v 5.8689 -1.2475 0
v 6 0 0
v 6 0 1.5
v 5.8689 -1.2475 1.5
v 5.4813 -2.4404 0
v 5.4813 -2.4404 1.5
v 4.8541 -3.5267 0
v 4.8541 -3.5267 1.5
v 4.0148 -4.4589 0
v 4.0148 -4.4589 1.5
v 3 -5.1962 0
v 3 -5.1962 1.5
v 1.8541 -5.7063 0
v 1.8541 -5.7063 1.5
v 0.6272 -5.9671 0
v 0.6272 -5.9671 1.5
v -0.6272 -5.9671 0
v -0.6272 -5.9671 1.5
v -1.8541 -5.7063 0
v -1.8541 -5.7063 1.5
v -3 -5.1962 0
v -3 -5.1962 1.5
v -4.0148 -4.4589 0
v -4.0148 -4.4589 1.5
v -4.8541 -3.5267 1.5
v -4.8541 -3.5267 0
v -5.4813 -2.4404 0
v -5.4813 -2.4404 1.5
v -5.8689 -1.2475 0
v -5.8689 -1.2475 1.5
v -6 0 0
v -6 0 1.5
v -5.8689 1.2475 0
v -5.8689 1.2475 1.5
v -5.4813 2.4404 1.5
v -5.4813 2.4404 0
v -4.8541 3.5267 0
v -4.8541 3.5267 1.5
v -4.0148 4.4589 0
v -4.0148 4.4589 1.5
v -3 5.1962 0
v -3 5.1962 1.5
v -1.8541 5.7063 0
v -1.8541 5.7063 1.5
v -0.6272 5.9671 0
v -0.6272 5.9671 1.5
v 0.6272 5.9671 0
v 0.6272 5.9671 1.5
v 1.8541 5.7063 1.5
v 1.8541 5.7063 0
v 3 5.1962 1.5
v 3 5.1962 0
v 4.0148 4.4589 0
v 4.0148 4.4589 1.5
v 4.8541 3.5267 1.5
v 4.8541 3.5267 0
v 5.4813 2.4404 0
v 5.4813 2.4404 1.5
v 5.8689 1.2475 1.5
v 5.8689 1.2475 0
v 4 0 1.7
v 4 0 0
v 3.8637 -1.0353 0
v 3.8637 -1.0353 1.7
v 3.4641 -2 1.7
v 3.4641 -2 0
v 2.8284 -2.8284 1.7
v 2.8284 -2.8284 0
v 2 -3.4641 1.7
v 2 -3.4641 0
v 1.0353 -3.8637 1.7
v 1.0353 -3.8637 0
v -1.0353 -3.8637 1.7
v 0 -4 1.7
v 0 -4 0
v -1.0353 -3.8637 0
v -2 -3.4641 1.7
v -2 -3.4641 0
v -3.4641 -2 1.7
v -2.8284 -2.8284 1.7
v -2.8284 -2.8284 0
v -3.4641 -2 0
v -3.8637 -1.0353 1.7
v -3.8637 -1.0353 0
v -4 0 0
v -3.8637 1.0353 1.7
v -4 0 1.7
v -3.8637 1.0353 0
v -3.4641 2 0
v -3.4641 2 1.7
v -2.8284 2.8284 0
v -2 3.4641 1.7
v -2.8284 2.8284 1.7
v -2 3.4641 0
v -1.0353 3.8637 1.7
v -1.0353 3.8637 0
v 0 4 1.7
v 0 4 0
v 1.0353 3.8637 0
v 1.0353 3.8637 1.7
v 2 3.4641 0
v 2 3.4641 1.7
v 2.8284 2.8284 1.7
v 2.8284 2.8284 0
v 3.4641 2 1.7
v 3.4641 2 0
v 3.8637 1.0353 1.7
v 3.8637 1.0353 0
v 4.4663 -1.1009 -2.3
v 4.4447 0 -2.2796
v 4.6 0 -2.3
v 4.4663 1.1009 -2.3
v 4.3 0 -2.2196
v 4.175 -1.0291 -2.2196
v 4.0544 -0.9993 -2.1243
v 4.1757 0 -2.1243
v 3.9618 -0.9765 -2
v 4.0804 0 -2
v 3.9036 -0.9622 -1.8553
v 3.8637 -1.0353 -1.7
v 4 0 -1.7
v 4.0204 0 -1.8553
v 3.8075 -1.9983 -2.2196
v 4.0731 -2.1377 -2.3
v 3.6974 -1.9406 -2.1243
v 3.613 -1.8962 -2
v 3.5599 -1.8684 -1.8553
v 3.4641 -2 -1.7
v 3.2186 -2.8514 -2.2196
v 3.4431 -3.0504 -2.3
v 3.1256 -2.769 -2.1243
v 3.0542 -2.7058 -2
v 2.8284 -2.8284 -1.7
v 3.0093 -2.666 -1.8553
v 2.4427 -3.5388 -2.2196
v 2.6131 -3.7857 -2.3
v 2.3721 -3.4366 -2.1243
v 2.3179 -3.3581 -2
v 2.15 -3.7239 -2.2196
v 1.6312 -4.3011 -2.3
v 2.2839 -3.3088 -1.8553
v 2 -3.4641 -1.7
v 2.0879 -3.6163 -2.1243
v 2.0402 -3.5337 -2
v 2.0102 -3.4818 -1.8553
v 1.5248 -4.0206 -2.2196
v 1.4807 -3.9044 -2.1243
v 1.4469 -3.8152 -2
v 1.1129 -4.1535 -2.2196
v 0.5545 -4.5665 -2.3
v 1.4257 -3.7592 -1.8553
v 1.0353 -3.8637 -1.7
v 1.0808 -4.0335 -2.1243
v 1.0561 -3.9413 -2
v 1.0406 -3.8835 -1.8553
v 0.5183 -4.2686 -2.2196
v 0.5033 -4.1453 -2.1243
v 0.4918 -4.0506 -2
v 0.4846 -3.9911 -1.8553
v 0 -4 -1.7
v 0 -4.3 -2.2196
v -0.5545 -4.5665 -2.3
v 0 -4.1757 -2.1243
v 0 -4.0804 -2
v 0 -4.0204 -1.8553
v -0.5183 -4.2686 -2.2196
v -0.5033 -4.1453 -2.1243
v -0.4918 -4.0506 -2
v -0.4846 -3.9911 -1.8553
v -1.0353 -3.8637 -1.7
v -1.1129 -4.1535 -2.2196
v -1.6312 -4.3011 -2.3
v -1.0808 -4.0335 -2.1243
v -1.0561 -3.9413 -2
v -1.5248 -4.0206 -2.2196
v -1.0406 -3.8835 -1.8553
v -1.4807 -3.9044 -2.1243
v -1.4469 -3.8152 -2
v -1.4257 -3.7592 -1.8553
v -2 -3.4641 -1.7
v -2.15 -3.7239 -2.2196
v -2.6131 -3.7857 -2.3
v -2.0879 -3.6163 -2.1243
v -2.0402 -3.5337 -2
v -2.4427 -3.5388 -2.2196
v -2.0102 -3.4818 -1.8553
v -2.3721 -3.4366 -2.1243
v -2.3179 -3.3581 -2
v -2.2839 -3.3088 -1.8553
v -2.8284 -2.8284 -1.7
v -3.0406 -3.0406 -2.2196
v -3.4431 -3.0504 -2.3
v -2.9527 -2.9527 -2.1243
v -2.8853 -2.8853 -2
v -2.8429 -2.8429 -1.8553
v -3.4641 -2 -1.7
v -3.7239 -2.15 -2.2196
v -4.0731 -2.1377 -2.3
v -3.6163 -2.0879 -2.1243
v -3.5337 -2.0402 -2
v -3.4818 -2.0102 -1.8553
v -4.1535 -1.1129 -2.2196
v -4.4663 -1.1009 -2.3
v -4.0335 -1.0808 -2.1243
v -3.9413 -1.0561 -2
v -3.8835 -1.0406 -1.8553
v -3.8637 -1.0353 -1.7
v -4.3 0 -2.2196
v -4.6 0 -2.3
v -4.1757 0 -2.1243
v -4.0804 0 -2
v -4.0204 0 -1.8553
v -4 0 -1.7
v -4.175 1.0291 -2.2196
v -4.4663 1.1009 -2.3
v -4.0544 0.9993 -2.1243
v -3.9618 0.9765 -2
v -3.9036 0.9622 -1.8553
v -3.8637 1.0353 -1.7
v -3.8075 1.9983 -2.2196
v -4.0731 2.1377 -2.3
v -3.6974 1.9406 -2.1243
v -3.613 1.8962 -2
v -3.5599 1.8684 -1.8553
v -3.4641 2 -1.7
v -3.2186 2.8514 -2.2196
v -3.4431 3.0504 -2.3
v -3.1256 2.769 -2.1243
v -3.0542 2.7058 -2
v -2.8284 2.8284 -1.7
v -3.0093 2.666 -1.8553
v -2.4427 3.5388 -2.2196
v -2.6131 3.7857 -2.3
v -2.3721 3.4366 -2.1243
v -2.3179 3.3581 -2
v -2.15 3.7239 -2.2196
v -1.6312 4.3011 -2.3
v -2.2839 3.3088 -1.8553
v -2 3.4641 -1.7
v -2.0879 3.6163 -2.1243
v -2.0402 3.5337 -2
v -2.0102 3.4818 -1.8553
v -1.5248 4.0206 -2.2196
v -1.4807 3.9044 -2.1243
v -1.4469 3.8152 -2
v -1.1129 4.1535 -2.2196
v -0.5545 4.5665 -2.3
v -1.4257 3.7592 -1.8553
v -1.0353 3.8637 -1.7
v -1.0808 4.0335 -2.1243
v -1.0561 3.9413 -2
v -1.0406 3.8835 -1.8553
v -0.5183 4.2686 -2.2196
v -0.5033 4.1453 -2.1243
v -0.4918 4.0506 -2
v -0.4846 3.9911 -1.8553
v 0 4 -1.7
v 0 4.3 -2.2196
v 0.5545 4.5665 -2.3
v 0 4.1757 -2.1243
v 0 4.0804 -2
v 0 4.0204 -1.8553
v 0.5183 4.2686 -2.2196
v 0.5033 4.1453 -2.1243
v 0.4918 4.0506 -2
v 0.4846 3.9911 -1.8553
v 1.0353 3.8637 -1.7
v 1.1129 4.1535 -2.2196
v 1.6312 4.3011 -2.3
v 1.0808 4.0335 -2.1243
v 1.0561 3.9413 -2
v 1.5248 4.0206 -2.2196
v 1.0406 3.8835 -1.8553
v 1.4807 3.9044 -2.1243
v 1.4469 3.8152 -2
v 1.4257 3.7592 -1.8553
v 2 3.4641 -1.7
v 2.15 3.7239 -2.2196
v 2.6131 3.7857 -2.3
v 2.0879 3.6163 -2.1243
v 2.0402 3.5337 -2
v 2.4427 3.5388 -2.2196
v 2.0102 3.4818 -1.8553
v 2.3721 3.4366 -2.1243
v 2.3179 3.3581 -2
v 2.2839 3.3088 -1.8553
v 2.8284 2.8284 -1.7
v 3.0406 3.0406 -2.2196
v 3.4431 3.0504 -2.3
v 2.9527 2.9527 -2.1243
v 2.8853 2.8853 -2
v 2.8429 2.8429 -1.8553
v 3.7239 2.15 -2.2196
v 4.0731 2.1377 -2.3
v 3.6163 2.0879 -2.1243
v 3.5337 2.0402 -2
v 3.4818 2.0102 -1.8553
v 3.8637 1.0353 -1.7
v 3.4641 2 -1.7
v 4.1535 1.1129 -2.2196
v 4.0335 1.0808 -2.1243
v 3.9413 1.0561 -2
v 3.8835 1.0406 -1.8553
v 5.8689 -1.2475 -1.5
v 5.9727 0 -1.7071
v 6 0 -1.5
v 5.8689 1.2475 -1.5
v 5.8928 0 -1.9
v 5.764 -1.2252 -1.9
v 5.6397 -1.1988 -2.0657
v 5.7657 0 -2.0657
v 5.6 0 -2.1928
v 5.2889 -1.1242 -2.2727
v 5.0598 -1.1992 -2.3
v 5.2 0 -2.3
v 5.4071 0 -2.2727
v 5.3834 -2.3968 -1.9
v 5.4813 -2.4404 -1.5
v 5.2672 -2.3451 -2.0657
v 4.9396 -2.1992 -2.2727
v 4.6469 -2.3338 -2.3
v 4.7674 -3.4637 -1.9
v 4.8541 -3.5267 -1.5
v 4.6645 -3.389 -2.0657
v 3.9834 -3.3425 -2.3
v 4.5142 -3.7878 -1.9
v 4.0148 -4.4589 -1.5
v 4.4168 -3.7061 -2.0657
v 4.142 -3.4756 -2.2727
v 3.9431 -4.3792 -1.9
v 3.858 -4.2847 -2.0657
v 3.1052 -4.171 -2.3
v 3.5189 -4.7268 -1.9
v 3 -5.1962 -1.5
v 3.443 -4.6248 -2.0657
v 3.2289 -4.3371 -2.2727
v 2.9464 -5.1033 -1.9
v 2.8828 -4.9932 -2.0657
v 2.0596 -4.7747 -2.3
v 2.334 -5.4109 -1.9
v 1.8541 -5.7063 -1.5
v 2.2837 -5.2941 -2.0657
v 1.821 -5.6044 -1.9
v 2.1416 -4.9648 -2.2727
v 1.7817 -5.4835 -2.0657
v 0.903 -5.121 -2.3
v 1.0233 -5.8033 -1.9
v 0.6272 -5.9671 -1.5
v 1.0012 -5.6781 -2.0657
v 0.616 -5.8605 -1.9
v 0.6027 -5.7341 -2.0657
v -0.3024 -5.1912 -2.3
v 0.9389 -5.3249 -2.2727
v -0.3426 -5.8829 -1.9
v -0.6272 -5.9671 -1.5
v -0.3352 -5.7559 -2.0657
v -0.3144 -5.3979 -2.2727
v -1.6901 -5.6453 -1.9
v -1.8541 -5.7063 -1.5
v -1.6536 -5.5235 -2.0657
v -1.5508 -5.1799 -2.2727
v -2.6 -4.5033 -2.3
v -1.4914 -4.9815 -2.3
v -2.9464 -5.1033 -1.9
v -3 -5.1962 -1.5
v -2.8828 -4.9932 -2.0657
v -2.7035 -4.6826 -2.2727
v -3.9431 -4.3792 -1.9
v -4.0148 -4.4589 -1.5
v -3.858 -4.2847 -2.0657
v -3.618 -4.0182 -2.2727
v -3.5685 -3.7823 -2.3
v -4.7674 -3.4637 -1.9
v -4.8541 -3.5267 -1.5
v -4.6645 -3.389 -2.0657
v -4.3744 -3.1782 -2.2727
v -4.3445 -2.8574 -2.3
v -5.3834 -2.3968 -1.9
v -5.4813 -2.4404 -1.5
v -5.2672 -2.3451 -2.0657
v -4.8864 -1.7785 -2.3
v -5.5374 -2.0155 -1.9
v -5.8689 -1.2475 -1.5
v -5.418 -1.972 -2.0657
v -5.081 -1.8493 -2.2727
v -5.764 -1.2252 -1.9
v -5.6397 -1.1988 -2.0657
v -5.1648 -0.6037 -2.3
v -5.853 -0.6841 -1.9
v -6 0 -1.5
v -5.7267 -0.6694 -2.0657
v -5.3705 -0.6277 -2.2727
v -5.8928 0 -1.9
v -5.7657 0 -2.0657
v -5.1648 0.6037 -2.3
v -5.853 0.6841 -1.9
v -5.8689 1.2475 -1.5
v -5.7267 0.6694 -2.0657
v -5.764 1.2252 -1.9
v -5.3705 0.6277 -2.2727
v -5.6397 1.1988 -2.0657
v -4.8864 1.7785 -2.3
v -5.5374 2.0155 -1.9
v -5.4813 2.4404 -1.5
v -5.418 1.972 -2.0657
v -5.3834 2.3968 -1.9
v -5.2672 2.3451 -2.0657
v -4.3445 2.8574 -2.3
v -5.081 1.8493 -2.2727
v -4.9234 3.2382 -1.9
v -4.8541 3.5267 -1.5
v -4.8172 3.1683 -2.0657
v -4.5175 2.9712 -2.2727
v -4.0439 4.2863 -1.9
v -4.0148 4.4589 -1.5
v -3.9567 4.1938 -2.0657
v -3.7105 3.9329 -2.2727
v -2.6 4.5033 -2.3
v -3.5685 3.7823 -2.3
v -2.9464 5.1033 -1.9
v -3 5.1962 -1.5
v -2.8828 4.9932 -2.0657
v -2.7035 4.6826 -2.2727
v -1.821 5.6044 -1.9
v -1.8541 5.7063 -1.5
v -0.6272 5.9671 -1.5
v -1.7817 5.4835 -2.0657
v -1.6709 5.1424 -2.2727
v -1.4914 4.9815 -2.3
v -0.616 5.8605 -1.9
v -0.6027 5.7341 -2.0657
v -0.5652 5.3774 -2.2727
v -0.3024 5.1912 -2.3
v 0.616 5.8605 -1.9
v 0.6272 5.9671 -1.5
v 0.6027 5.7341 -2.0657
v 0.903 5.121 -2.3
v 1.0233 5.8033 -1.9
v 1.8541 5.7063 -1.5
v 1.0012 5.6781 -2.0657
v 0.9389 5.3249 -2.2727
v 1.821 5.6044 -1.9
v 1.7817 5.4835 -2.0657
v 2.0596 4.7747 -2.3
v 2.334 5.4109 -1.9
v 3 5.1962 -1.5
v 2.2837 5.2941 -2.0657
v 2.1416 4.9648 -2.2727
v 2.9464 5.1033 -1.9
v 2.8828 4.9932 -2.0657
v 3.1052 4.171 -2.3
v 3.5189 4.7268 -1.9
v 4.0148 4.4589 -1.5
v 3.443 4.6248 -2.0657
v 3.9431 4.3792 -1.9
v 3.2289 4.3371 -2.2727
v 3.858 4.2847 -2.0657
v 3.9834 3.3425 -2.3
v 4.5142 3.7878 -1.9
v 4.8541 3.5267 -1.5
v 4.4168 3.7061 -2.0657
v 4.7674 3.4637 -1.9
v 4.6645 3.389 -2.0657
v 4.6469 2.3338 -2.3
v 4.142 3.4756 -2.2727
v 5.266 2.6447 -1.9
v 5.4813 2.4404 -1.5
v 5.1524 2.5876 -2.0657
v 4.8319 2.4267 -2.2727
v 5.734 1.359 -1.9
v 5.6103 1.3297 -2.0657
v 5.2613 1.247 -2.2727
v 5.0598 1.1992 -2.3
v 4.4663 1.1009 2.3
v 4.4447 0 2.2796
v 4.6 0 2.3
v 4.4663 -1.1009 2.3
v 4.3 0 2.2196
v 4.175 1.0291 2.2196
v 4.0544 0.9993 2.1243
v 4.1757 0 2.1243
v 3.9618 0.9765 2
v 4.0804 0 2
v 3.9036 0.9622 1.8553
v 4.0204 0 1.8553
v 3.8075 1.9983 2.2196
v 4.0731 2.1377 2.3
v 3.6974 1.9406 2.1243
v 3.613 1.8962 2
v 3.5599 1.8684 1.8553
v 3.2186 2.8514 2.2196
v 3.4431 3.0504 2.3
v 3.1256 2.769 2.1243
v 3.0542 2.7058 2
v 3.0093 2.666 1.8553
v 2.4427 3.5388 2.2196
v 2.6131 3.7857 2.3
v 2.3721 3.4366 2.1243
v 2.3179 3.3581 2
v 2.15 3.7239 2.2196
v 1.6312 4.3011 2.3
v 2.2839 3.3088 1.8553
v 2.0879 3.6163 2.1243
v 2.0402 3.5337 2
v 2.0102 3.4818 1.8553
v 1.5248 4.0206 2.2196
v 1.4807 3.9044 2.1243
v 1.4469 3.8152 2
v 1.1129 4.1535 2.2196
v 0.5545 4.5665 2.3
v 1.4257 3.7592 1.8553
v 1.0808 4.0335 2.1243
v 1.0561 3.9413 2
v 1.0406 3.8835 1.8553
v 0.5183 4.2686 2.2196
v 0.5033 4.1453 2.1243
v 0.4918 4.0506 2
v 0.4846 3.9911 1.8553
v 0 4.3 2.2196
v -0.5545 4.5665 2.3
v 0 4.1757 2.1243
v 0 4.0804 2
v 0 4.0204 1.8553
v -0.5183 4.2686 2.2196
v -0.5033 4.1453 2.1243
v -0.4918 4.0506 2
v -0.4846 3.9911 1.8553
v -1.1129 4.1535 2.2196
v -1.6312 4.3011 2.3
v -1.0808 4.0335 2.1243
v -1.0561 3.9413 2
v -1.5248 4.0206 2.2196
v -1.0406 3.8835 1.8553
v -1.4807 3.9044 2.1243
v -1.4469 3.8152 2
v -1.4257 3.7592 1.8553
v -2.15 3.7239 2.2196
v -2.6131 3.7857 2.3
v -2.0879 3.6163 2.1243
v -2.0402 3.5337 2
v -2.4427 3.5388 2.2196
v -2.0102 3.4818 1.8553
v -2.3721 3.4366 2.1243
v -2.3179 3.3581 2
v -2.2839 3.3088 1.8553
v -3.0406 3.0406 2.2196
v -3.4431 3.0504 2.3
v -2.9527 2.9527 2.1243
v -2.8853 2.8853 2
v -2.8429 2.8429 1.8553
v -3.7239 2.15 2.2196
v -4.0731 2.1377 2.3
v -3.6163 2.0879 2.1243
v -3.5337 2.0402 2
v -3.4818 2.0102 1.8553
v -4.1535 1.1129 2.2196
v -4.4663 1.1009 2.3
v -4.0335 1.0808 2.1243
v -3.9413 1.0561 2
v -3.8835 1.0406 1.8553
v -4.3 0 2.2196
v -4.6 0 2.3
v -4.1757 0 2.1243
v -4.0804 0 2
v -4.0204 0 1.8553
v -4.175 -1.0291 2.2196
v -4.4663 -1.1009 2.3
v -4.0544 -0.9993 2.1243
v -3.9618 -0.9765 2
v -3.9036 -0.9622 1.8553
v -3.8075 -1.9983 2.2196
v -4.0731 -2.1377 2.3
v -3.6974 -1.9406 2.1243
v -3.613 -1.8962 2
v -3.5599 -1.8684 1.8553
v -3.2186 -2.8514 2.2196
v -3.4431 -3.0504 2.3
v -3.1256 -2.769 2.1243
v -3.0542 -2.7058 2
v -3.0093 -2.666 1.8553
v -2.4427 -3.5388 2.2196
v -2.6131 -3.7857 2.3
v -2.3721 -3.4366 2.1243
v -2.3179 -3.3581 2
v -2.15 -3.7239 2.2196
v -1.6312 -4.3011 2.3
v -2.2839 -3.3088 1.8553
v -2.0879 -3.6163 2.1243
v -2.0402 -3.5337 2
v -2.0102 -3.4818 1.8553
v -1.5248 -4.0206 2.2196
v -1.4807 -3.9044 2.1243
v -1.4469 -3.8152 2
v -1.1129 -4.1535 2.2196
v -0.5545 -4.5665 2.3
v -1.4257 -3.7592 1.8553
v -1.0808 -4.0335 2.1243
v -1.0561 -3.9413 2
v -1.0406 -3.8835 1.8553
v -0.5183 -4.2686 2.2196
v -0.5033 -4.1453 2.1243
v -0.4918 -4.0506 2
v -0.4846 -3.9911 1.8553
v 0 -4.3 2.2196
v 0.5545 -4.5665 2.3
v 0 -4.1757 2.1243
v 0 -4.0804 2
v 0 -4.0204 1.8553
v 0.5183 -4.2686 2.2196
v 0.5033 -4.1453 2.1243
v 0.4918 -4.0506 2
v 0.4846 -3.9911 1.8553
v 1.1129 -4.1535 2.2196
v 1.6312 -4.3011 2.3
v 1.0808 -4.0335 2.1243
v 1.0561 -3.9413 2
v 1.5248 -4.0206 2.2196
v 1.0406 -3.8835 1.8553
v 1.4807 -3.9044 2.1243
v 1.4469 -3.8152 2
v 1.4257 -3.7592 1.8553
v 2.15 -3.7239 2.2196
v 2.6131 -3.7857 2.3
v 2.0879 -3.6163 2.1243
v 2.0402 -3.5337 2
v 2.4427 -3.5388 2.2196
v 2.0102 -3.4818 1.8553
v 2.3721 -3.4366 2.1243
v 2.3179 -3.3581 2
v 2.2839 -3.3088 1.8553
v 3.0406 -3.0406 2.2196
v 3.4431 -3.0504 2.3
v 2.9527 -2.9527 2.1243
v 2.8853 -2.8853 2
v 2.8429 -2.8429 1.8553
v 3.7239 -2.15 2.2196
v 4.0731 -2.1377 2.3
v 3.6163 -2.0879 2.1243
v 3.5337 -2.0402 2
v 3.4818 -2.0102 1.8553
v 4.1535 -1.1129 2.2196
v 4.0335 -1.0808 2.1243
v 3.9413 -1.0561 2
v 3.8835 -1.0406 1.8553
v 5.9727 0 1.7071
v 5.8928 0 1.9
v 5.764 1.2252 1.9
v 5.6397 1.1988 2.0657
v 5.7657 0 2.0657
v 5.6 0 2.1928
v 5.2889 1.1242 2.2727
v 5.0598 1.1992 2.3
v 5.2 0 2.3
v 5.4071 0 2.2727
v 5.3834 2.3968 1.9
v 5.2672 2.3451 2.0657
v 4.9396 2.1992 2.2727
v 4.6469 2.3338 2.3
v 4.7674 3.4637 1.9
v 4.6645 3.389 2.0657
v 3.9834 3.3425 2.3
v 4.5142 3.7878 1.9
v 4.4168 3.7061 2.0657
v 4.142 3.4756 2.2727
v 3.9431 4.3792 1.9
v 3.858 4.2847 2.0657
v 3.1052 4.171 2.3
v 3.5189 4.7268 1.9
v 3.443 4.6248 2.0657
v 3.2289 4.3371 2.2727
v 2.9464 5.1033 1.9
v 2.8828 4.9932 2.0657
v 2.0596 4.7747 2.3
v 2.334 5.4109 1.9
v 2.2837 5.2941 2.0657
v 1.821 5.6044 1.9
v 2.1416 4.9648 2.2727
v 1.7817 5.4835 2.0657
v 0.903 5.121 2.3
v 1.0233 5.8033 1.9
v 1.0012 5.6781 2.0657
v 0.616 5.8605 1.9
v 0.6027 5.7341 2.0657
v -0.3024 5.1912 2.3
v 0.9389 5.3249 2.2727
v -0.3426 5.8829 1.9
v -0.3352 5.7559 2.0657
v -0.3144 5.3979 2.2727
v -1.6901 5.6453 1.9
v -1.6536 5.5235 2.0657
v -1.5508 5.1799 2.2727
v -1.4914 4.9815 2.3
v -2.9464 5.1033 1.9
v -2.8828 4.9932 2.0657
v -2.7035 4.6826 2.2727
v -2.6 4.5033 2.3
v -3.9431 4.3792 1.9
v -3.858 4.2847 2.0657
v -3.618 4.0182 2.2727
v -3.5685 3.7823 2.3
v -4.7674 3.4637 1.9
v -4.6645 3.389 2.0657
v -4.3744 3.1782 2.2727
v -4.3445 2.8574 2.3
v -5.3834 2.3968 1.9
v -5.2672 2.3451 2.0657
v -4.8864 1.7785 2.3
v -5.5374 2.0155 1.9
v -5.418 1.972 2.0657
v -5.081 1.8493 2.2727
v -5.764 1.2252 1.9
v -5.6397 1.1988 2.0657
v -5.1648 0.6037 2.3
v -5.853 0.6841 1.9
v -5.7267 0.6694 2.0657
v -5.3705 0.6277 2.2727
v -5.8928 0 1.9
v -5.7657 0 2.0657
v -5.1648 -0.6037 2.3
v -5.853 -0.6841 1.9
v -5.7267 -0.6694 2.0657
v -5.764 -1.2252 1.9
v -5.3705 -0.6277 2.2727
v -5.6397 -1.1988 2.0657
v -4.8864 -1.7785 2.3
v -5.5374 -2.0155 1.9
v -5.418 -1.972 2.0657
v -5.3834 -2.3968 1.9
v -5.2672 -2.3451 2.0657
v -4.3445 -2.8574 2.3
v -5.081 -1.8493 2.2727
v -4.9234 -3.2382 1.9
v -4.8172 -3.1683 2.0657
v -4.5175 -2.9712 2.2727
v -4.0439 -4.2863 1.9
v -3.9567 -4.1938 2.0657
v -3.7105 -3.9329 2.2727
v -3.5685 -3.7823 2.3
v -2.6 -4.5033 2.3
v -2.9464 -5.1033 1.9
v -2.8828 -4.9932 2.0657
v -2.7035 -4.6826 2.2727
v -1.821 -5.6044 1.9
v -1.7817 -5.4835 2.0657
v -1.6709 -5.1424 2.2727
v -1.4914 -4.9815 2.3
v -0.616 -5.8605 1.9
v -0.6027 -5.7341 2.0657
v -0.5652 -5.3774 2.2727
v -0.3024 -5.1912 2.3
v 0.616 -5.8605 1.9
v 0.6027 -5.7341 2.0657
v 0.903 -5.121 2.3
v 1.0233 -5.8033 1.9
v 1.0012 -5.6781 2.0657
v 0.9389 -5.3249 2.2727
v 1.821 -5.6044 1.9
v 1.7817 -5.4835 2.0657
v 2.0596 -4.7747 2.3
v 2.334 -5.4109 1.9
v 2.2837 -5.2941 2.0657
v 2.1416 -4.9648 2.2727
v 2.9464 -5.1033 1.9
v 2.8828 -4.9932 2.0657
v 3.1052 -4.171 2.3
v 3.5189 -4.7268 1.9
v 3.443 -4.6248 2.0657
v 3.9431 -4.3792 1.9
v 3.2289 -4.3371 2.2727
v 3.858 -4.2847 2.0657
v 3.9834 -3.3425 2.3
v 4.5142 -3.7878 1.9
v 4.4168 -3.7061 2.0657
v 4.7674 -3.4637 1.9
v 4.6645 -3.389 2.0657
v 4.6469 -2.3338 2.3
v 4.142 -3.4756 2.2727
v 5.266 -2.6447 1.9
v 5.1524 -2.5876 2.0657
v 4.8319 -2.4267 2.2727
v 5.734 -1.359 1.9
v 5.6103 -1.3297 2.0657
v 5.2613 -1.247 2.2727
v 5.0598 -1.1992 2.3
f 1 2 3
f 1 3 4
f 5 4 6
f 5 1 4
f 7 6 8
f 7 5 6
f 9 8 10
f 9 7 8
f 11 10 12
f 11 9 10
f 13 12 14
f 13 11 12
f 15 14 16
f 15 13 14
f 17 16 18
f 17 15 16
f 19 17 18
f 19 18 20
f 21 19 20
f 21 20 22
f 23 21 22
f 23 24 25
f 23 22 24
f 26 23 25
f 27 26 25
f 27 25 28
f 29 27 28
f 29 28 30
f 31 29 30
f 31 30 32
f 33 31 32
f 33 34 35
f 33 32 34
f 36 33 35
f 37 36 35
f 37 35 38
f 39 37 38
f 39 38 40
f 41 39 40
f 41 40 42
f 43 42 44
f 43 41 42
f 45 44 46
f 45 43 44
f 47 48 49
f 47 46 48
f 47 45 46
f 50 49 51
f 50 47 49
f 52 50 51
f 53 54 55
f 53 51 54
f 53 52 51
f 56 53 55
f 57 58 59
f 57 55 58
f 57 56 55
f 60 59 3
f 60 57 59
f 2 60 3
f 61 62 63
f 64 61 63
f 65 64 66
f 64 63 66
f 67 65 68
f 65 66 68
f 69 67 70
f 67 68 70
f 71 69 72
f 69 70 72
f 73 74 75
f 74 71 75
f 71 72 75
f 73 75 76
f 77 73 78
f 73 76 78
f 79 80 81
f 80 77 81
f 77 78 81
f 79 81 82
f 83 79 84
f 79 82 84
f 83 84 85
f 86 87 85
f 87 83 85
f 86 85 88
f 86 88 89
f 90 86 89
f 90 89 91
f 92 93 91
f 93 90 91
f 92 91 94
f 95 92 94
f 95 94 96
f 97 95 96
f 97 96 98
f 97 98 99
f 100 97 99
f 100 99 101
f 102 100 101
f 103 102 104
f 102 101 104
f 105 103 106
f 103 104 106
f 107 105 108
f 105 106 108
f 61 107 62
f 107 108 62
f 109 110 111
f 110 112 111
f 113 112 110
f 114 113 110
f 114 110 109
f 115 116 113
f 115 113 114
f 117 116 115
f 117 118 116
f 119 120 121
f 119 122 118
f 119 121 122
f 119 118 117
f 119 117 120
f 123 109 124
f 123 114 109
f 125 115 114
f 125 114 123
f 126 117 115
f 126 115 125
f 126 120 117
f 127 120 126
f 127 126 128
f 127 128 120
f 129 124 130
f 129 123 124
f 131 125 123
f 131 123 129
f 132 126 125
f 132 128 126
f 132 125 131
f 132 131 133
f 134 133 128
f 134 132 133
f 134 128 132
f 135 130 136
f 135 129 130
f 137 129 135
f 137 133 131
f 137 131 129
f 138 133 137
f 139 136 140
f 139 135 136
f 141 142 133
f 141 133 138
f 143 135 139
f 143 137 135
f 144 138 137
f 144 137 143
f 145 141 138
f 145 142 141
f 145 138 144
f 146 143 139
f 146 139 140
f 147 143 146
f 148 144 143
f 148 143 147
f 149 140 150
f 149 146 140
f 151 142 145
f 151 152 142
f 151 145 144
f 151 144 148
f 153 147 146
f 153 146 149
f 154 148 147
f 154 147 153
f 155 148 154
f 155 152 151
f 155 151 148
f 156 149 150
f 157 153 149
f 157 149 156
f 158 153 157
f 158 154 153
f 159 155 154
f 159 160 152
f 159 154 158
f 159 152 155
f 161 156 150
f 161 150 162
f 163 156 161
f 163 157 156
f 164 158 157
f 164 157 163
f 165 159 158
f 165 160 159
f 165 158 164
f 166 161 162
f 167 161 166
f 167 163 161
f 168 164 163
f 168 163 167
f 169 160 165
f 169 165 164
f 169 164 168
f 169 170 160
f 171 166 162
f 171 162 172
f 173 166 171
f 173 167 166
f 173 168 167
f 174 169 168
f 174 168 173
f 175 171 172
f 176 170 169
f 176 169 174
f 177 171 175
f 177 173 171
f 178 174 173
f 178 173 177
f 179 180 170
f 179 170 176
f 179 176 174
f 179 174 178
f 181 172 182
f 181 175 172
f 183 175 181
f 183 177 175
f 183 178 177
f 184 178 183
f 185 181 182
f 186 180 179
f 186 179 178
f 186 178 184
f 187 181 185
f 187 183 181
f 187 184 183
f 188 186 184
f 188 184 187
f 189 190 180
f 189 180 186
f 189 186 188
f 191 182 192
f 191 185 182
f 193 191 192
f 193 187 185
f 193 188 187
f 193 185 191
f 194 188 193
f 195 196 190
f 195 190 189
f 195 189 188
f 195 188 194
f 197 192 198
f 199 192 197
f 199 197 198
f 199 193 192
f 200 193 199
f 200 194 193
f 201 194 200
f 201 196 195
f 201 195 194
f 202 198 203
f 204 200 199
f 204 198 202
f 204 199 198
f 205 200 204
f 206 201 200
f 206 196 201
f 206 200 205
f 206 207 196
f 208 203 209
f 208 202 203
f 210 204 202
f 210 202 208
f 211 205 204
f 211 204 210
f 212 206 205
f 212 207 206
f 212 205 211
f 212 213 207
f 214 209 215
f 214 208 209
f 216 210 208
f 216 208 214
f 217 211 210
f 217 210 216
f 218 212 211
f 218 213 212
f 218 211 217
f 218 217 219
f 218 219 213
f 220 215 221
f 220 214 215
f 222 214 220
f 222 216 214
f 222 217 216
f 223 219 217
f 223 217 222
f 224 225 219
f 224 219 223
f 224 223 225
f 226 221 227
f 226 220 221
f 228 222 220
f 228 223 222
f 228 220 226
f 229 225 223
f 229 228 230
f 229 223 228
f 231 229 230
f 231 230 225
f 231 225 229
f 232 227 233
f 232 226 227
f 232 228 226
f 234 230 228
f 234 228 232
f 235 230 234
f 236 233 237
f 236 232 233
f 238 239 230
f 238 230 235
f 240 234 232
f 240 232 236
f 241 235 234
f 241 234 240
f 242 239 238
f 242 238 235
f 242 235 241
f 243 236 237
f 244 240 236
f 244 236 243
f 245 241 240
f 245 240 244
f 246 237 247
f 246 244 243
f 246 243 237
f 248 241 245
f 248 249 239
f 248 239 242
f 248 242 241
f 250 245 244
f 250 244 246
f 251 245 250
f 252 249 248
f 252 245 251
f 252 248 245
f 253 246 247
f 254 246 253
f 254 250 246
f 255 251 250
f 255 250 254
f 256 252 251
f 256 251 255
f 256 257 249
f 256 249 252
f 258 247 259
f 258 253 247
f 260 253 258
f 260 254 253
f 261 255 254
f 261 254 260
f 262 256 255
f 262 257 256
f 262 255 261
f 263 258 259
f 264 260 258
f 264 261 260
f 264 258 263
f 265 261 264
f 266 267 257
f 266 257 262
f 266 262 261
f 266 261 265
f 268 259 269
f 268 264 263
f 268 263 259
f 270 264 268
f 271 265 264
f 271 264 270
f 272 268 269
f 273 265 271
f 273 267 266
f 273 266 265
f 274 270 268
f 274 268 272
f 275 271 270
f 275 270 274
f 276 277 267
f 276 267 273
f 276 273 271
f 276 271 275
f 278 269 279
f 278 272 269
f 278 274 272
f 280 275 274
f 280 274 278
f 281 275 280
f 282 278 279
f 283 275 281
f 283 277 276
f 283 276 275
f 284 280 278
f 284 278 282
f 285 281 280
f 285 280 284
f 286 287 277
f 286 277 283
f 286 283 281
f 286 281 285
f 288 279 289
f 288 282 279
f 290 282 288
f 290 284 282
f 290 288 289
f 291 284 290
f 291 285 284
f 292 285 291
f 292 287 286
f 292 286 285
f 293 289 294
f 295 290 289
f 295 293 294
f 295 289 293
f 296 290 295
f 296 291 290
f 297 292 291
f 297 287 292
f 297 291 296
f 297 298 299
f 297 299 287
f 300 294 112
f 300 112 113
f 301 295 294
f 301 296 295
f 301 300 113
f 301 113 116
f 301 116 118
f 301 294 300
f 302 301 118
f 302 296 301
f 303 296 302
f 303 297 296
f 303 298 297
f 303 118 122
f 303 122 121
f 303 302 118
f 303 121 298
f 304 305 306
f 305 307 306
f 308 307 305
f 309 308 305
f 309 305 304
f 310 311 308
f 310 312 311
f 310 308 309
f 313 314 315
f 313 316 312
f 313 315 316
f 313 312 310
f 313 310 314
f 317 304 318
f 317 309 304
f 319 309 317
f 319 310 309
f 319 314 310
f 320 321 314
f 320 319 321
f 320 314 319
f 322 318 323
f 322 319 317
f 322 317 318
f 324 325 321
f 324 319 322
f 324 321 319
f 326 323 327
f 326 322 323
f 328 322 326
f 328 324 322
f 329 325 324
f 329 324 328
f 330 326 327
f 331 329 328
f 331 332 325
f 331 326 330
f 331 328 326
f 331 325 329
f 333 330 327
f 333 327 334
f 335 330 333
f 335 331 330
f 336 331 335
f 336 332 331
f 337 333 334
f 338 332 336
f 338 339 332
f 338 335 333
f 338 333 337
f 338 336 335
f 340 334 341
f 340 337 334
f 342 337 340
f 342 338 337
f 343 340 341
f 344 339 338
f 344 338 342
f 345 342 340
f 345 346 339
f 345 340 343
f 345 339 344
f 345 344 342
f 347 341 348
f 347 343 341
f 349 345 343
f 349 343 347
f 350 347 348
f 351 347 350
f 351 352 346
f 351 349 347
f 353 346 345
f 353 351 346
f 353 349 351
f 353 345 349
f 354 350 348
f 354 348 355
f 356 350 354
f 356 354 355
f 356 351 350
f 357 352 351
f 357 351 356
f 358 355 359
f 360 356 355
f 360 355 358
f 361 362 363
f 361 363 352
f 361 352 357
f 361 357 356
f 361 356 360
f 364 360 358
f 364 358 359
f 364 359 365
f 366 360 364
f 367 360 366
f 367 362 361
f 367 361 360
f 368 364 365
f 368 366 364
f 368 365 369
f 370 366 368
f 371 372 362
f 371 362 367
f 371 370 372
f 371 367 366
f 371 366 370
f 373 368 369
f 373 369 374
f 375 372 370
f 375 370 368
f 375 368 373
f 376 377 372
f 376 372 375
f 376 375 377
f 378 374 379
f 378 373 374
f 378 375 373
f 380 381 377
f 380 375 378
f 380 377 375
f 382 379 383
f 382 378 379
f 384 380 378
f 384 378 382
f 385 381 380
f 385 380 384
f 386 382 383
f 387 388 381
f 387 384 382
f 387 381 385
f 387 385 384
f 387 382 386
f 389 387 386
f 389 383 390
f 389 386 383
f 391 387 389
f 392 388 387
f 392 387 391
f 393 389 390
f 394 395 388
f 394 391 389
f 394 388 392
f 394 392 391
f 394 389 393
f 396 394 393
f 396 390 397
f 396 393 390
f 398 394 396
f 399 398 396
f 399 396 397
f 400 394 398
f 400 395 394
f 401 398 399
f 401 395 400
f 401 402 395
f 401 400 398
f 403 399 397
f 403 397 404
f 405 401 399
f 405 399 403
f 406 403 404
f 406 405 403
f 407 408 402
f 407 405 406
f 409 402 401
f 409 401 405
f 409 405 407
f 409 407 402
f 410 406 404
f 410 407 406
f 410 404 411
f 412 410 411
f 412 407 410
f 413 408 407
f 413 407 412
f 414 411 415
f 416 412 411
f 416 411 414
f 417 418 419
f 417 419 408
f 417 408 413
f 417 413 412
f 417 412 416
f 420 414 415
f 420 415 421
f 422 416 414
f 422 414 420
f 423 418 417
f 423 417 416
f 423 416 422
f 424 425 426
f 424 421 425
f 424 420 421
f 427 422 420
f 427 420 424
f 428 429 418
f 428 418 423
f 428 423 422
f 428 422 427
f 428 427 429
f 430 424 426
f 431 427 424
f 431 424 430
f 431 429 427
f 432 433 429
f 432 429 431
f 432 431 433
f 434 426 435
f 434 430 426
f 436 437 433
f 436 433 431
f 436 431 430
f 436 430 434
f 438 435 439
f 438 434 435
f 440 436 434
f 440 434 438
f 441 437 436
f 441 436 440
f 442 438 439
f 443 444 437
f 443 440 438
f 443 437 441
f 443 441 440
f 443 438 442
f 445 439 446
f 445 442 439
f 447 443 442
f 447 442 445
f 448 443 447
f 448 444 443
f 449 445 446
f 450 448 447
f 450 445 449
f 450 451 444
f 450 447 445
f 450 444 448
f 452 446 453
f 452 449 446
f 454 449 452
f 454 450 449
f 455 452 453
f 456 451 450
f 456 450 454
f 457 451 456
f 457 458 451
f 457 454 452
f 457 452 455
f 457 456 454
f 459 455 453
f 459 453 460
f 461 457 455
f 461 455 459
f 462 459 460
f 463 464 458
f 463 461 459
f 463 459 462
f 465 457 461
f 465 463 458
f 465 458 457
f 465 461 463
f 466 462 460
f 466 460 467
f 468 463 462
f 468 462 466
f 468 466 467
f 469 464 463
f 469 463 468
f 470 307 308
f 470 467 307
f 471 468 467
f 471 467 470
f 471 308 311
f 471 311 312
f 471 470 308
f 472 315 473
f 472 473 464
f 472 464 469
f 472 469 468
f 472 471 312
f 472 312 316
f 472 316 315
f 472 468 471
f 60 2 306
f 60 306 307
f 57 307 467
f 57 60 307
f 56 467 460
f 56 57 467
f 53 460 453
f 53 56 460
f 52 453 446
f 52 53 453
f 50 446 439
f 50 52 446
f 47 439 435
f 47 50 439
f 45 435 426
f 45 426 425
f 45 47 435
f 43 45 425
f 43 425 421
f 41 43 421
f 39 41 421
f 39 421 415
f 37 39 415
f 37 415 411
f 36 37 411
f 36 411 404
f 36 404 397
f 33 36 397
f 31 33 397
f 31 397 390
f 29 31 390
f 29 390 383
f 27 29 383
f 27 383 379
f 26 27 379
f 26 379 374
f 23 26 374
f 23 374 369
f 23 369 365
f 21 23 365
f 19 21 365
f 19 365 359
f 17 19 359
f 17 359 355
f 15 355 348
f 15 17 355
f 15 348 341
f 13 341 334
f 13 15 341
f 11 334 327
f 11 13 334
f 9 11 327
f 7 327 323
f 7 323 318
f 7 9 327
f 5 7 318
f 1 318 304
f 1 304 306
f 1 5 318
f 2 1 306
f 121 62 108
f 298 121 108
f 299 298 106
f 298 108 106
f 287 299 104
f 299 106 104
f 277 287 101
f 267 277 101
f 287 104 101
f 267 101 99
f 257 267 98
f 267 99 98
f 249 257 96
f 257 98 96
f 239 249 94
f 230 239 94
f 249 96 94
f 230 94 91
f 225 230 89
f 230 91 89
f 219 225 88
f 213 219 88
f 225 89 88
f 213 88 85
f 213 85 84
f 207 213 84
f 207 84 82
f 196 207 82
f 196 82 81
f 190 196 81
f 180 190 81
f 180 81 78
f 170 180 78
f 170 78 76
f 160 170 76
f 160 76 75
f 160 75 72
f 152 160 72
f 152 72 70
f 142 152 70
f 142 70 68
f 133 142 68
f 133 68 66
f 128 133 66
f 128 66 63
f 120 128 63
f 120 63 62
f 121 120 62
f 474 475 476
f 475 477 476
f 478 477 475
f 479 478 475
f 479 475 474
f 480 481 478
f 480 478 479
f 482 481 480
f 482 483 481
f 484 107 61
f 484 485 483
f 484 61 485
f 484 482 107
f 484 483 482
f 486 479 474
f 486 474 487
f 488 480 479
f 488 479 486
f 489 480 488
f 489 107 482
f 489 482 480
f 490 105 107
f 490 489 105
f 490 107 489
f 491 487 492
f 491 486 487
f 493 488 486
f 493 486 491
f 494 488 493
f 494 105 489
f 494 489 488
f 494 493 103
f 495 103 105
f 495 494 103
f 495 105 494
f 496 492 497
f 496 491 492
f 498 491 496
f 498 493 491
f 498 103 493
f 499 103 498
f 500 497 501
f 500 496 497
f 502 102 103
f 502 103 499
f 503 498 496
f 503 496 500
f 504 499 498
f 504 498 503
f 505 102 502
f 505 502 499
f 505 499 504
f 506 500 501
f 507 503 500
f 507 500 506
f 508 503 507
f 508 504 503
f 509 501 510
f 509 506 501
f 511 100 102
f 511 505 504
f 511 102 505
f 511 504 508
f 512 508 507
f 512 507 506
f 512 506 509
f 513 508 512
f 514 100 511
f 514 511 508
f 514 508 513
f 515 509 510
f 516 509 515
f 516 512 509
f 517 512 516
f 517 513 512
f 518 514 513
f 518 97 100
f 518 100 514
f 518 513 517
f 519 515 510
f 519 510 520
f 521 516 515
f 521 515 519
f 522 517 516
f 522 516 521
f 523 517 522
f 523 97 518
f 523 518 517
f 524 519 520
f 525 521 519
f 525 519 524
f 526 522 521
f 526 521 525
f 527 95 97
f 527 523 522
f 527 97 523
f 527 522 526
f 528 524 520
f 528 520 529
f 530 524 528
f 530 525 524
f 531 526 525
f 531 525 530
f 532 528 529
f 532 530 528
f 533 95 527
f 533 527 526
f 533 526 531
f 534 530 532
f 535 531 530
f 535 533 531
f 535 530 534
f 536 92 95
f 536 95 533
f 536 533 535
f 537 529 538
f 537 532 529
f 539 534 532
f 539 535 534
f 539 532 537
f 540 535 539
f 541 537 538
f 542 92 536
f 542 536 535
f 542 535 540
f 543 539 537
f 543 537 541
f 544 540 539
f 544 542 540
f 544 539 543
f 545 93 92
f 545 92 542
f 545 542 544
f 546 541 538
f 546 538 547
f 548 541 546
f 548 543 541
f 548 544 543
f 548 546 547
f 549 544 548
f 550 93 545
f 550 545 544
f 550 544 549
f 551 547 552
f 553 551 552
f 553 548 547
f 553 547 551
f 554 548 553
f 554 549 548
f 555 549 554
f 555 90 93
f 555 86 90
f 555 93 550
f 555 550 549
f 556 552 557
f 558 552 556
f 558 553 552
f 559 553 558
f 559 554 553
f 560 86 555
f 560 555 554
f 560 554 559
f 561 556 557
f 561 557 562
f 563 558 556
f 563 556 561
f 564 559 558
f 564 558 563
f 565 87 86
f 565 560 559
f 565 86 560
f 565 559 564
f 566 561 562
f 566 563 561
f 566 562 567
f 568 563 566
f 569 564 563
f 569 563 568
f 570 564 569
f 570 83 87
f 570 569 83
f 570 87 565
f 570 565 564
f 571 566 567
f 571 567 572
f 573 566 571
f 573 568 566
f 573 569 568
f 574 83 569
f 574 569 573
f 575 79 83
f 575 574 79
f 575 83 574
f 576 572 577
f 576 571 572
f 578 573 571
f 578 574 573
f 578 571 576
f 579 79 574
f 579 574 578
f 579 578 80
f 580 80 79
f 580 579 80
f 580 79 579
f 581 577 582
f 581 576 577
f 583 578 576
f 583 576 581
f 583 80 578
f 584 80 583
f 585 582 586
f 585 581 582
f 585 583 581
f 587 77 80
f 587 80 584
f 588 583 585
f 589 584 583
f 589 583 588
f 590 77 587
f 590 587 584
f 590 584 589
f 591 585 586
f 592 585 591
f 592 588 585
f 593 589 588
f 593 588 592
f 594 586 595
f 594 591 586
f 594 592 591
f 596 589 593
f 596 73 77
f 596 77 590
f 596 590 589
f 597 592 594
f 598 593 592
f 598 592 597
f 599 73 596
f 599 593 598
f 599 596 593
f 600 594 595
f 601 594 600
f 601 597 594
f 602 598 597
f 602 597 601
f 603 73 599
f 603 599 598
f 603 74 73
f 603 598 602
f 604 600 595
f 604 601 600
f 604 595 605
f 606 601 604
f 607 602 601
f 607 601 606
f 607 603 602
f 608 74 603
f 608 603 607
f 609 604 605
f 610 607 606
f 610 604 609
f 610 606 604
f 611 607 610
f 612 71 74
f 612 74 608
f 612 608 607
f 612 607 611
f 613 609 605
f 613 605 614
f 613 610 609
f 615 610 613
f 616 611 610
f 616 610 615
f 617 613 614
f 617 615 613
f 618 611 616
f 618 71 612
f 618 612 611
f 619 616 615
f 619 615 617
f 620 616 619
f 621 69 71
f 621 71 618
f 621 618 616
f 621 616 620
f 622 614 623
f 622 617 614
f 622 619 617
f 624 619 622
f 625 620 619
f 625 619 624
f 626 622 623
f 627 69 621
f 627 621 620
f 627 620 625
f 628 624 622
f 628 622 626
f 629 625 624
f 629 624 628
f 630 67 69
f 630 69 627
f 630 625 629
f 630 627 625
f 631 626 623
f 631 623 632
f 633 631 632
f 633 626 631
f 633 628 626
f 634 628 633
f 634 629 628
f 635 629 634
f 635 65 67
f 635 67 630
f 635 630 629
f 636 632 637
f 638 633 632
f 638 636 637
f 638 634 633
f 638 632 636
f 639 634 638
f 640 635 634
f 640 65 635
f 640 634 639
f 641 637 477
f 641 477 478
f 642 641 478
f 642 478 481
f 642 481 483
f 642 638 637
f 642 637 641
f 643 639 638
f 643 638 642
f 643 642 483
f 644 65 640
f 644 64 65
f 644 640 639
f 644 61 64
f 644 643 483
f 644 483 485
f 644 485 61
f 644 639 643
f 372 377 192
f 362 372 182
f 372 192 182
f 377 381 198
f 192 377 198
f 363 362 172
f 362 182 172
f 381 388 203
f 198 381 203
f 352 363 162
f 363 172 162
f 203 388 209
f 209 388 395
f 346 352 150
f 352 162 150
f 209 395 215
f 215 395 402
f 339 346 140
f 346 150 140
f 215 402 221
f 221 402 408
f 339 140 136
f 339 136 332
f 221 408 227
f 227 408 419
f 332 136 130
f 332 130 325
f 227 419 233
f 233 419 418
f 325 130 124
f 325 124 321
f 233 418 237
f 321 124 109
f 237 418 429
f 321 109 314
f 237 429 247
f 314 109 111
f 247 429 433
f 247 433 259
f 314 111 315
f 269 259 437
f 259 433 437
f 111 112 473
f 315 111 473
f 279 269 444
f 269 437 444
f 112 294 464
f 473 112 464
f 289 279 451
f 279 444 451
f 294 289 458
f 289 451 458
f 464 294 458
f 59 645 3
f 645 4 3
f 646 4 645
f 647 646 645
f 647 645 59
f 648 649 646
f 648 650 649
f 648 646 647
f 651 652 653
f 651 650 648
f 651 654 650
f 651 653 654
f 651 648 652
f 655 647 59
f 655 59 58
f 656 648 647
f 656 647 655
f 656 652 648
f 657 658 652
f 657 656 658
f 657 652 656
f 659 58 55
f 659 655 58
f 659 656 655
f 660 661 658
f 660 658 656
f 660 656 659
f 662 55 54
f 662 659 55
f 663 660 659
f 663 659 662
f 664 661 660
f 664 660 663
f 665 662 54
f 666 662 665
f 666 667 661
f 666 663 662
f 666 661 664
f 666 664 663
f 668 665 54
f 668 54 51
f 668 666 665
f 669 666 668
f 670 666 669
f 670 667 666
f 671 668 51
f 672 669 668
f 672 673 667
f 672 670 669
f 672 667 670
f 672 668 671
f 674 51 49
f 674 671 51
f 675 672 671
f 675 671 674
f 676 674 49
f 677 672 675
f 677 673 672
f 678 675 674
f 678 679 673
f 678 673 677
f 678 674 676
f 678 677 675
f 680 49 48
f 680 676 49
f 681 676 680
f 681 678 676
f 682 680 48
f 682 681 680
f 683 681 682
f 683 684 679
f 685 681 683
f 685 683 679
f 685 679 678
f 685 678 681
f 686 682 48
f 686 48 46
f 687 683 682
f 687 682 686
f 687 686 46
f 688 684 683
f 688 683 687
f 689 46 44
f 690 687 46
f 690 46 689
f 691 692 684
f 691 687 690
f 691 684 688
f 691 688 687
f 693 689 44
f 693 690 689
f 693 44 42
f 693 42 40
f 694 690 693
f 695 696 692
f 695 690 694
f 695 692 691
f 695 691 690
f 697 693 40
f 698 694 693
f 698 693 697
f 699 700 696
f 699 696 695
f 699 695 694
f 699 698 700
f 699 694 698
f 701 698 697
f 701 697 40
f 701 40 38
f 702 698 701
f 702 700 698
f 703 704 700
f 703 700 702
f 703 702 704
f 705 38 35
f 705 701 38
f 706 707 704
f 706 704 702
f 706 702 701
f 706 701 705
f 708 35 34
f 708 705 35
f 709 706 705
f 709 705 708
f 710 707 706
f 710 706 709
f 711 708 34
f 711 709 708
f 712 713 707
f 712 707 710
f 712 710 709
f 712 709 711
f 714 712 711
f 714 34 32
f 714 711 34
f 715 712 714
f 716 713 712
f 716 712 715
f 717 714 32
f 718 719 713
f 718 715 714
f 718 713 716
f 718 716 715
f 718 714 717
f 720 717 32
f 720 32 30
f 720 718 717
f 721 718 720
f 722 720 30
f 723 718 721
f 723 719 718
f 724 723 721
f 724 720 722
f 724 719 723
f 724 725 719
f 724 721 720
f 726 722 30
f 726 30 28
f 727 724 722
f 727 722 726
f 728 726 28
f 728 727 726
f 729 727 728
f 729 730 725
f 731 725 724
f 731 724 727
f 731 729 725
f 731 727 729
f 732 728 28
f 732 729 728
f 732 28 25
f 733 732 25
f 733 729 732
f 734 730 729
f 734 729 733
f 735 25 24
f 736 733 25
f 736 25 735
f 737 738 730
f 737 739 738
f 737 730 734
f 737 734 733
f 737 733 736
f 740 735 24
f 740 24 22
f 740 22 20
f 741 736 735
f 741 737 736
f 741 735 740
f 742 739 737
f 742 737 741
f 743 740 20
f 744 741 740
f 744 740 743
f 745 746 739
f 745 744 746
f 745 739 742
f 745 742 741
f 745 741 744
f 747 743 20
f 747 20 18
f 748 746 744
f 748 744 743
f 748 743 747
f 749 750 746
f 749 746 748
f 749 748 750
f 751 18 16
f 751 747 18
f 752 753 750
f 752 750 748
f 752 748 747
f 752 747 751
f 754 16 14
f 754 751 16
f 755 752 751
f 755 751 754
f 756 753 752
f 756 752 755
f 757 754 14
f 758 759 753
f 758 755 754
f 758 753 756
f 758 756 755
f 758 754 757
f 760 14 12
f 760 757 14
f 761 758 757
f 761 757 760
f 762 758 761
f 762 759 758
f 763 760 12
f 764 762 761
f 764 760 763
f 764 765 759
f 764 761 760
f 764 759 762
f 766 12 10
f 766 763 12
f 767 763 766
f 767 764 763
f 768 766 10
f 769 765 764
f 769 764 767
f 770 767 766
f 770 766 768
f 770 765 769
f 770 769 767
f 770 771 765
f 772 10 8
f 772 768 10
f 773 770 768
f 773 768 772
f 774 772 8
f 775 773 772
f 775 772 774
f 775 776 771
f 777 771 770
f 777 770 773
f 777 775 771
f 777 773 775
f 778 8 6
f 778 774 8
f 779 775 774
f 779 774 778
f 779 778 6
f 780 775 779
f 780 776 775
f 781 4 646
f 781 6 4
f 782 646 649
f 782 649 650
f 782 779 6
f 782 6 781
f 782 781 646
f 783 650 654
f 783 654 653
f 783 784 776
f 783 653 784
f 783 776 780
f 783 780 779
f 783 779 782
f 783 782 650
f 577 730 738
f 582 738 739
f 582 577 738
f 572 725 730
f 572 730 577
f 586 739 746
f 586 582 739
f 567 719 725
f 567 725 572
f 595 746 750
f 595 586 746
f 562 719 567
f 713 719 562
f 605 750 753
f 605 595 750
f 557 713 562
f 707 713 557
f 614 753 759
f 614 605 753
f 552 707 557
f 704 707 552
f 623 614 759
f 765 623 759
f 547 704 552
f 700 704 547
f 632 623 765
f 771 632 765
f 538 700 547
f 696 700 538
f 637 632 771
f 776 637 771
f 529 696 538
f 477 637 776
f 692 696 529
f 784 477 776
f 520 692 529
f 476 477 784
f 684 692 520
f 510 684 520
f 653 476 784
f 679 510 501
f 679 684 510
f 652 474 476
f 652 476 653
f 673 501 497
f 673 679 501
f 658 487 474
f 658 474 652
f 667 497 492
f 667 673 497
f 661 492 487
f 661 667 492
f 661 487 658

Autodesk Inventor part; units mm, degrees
ref_plane "YZ Plane" through (0, 0, 0) normal (1, 0, 0) x (0, 1, 0)
ref_plane "XZ Plane" through (0, 0, 0) normal (0, 1, 0) x (-1, 0, 0)
ref_plane "XY Plane" through (0, 0, 0) normal (0, 0, 1) x (1, 0, 0)
sketch "Sketch1" plane through (0, 0, 0) normal (0, 0, 1) x (1, 0, 0)
  circle A0 centre (0, 0) radius 6
  circle A1 centre (0, 0) radius 4
  dimension "d0" = 12
  dimension "d1" = 8
extrude "Extrusion1" add sketch "Sketch1" along normal mid plane 4.6
fillet "Fillet2" radius 0.8 2 edges at (-6, 0, 2.3) (-6, 0, -2.3)
fillet "Fillet3" radius 0.6 2 edges at (-4, 0, 2.3) (-4, 0, -2.3)
properties part number "New_Tire"
